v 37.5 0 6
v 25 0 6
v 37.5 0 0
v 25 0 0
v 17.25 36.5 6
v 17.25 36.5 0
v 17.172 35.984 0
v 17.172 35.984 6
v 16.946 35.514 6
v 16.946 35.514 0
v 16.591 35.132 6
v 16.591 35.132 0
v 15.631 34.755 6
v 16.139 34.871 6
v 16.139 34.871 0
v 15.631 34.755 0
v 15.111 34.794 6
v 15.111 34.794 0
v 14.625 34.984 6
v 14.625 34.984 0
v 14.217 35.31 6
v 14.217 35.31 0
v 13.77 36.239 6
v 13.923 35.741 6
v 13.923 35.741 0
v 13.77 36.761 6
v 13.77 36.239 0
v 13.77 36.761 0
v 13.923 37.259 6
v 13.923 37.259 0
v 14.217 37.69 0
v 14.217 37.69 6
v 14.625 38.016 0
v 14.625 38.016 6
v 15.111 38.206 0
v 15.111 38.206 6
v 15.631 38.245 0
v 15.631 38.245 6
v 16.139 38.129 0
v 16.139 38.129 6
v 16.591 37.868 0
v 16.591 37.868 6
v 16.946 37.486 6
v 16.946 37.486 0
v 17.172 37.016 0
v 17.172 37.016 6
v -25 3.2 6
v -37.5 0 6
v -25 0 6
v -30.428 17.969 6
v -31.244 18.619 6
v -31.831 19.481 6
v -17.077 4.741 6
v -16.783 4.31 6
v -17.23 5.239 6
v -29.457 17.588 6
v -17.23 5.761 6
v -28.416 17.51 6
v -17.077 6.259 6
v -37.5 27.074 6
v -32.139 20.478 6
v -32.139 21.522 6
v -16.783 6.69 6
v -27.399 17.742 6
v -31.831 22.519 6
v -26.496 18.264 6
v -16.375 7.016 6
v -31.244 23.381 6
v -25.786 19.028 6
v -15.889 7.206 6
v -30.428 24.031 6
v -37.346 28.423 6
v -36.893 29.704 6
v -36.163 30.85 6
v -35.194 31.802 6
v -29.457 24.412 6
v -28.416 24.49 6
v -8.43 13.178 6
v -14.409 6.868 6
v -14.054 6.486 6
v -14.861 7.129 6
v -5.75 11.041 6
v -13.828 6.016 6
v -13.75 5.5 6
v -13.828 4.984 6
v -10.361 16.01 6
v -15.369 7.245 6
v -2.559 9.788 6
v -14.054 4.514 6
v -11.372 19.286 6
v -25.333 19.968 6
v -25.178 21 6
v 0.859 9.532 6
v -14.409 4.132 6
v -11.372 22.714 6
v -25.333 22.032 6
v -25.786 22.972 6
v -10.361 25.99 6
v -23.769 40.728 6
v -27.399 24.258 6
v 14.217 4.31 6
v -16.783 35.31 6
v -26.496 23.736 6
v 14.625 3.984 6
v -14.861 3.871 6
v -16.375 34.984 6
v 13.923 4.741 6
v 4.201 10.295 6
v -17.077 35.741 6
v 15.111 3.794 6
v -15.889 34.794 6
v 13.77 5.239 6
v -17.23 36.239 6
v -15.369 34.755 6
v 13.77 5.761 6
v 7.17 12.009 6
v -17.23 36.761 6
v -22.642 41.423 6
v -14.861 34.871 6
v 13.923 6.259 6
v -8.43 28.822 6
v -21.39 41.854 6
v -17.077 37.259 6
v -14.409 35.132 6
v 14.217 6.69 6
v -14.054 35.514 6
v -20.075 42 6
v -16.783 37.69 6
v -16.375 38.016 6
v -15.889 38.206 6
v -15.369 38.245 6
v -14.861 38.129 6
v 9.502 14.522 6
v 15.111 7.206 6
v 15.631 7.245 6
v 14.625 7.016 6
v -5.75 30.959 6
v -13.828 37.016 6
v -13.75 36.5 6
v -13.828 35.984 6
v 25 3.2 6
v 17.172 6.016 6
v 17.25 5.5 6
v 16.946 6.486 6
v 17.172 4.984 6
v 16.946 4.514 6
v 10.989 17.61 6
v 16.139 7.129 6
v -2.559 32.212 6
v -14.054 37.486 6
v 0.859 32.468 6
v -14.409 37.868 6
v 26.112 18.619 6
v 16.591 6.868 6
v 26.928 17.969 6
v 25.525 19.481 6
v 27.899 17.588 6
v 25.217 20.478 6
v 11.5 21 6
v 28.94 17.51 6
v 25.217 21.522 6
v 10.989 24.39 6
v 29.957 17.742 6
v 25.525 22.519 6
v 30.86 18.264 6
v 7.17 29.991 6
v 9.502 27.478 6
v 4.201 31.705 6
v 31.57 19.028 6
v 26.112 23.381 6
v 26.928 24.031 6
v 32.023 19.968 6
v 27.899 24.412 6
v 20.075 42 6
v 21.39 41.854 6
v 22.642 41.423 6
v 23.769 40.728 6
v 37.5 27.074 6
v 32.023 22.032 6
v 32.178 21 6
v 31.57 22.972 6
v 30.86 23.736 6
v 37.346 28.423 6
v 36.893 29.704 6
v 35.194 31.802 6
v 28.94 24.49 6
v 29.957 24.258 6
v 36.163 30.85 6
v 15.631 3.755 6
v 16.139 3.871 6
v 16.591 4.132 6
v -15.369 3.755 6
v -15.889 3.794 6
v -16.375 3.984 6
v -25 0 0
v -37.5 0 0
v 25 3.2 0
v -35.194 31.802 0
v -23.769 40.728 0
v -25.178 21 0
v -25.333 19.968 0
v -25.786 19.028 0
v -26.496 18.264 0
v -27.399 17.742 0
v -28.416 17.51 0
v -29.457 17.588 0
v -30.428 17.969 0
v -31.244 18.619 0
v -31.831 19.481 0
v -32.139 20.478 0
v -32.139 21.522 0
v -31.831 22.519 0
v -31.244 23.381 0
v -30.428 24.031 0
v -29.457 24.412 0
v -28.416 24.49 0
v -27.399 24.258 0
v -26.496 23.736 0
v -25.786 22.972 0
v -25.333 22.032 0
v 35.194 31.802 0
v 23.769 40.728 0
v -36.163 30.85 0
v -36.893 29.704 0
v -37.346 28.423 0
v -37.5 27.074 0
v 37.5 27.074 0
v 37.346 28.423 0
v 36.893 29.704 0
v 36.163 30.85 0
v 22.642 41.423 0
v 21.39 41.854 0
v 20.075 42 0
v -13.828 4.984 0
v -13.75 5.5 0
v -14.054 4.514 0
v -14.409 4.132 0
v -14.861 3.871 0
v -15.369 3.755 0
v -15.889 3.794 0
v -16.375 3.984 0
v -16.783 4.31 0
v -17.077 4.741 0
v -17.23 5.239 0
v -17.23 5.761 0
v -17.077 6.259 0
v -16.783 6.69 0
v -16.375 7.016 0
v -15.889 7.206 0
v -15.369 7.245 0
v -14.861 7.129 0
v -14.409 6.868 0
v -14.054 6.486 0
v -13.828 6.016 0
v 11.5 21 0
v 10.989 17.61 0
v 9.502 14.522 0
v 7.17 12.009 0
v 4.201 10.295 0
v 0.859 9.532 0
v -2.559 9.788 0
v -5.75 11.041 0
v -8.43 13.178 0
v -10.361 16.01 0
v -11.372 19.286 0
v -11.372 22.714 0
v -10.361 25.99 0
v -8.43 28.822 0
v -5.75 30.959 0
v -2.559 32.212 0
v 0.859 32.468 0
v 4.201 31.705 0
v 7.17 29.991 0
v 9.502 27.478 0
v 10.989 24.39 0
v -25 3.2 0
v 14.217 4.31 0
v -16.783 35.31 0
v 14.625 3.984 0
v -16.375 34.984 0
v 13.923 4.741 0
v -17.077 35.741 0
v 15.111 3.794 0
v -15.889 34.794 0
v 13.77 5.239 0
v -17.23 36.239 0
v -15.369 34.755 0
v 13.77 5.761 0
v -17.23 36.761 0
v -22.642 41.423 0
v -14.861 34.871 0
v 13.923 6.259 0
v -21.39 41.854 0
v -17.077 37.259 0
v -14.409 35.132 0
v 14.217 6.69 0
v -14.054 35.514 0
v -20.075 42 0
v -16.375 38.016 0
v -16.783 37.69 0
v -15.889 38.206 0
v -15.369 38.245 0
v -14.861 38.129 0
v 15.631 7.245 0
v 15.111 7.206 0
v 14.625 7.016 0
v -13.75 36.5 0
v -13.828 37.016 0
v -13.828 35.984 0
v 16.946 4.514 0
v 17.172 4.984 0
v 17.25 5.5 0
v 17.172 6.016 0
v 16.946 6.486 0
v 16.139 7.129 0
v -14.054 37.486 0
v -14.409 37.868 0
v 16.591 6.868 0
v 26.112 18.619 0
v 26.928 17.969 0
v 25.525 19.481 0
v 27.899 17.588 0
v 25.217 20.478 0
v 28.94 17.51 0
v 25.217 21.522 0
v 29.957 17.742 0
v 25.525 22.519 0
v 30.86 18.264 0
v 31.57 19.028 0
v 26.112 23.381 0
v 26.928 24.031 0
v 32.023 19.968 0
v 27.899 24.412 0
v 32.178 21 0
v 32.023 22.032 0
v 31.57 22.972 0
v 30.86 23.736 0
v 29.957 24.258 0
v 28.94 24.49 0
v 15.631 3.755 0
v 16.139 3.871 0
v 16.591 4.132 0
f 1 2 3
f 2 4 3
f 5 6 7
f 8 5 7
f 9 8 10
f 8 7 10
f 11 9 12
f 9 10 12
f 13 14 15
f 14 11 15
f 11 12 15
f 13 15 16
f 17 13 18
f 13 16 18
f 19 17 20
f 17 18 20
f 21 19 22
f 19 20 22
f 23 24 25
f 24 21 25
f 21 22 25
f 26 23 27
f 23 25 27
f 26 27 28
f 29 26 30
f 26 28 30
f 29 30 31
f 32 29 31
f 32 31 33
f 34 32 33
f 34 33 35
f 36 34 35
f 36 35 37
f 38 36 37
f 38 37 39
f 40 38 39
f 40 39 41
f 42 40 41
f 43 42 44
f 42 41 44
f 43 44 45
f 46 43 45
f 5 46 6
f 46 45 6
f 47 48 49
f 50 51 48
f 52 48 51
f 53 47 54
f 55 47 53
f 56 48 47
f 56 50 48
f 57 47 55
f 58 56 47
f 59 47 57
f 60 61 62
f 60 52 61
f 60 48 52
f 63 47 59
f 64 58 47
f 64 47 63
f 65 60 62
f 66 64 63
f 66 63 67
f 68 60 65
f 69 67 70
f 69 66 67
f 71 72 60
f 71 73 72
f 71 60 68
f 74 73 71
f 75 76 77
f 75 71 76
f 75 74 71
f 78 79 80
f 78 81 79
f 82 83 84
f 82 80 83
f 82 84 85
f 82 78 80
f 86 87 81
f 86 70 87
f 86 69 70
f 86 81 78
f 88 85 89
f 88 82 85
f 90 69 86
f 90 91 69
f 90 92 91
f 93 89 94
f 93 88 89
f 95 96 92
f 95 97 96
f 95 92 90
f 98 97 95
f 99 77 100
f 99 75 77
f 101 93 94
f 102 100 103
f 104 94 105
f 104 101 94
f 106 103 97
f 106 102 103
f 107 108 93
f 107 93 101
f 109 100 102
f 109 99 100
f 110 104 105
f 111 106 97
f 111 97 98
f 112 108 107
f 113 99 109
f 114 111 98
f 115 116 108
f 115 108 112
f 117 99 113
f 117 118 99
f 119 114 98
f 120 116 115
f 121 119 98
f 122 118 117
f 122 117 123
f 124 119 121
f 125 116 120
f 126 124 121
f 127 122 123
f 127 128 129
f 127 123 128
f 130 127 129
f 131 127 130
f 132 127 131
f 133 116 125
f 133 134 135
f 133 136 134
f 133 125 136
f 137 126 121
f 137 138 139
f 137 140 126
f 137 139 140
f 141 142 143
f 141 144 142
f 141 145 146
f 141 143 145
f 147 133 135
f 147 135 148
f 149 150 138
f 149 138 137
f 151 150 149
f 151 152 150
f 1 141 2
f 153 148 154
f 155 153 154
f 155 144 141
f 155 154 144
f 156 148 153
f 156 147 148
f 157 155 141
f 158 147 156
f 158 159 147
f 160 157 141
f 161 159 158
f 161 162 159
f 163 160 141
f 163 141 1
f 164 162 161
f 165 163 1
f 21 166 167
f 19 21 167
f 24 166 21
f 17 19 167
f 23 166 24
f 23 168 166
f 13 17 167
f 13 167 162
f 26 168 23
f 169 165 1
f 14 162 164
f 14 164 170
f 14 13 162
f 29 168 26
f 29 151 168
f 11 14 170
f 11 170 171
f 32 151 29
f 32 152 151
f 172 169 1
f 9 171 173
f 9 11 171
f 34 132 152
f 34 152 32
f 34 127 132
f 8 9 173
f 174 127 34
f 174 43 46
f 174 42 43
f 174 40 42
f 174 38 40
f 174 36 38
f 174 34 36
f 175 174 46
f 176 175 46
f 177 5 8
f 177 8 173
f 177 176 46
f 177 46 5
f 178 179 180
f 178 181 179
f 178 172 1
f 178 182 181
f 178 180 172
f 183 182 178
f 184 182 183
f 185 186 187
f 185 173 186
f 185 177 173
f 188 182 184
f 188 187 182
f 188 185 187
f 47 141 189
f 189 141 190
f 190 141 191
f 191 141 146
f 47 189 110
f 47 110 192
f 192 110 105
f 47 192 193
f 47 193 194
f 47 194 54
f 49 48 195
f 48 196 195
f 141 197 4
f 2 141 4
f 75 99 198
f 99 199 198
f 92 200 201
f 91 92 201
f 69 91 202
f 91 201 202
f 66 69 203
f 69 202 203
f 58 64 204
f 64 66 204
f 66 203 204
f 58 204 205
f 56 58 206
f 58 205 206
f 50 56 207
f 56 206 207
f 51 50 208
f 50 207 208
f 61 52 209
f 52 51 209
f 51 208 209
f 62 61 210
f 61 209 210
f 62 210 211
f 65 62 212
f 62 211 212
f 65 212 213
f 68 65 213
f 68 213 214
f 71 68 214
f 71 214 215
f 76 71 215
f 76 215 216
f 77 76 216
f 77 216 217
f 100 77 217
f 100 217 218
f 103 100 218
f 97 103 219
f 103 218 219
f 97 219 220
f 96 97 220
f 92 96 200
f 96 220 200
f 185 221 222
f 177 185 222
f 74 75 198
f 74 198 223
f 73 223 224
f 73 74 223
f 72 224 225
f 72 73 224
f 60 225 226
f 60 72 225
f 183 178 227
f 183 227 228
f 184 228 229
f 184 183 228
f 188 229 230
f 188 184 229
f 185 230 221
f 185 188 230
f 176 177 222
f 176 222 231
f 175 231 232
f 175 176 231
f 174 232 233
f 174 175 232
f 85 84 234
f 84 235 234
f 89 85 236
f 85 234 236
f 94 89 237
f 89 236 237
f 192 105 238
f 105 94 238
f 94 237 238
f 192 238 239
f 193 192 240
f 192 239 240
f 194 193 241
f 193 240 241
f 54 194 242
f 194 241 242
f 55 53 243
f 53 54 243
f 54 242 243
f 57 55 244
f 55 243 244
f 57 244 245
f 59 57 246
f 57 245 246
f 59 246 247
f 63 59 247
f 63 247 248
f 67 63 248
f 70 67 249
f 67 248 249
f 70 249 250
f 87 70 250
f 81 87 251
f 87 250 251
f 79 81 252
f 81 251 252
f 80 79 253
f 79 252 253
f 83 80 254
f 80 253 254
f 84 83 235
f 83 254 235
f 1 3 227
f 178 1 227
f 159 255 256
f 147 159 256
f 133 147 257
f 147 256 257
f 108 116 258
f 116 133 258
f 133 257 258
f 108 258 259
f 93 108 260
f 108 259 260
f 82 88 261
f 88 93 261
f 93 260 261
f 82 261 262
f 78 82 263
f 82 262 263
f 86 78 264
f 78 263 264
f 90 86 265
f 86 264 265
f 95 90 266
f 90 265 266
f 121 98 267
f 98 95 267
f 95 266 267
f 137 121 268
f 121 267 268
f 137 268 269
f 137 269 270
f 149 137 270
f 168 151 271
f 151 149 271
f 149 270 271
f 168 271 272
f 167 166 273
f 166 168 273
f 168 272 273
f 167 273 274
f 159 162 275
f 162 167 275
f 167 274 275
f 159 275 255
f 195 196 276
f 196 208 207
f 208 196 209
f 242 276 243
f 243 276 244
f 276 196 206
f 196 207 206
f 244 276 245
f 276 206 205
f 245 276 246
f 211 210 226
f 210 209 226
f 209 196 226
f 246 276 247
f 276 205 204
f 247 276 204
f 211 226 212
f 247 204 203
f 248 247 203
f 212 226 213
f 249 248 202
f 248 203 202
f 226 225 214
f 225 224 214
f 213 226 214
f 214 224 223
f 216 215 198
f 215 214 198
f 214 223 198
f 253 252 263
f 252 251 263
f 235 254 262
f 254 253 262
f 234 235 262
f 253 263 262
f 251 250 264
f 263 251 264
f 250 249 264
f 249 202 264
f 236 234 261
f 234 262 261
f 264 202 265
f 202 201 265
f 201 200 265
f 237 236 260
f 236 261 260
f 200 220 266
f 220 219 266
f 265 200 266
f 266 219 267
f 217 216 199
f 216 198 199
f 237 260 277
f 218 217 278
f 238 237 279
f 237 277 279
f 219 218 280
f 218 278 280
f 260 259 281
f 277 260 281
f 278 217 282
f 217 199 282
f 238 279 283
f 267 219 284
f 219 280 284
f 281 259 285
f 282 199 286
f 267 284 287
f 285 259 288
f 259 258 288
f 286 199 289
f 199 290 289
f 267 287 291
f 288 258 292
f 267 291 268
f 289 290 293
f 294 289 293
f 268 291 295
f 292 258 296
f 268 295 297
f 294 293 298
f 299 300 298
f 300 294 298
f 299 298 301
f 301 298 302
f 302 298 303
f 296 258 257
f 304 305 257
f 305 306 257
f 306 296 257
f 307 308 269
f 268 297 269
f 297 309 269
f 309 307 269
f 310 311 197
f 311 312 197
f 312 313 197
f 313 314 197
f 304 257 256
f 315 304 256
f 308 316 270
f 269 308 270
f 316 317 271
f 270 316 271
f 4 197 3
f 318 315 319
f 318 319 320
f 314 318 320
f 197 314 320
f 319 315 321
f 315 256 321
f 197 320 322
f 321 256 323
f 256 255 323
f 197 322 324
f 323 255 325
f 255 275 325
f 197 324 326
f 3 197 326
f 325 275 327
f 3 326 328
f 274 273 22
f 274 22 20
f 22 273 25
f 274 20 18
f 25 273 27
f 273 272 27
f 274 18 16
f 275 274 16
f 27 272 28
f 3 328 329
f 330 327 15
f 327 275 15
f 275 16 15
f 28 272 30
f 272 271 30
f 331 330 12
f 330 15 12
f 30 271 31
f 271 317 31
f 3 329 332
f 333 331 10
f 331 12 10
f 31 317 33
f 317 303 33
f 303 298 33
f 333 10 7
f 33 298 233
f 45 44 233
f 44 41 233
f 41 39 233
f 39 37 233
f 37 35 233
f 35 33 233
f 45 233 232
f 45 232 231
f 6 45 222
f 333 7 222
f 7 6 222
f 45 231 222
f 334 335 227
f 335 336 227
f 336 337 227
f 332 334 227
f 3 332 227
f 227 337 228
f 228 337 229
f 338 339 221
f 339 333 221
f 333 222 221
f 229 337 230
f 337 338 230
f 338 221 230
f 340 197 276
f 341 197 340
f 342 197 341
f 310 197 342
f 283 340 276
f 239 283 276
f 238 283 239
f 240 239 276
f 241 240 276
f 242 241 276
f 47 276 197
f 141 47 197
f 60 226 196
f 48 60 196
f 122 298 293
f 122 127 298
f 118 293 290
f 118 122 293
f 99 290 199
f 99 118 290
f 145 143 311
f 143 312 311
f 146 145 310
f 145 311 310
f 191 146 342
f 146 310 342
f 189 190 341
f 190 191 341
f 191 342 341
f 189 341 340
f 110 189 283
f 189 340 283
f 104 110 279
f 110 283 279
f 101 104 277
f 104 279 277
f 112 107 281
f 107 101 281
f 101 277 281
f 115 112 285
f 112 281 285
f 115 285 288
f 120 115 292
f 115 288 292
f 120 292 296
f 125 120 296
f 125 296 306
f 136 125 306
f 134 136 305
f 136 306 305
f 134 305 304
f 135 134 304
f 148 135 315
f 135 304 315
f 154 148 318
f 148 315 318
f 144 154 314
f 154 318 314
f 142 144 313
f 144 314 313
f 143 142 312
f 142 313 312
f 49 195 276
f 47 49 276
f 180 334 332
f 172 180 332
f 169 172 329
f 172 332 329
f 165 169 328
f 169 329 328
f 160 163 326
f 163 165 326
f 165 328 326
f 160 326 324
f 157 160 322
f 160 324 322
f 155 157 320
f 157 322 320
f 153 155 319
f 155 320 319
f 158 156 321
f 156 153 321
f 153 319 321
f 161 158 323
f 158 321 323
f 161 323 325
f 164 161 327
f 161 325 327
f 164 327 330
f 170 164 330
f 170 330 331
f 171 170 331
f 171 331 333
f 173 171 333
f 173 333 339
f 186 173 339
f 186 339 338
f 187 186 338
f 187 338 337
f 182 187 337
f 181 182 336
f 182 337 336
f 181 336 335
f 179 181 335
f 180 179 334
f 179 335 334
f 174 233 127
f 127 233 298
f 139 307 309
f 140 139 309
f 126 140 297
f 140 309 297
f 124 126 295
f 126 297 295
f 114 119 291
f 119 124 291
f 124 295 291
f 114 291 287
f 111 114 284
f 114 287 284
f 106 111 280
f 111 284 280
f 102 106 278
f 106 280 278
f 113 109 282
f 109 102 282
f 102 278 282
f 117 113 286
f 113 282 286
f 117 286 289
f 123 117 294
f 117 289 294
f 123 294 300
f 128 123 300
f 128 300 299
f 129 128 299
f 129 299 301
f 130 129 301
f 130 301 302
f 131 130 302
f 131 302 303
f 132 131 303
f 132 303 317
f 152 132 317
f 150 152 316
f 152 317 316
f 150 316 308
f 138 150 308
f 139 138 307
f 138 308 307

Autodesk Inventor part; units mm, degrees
ref_plane "YZ Plane" through (0, 0, 0) normal (1, 0, 0) x (0, 1, 0)
ref_plane "XZ Plane" through (0, 0, 0) normal (0, 1, 0) x (-1, 0, 0)
ref_plane "XY Plane" through (0, 0, 0) normal (0, 0, 1) x (1, 0, 0)
sketch "Sketch1" plane through (0, 0, 0) normal (0, 0, 1) x (1, 0, 0)
  line L0 (37.5, 0) -> (37.5, 30)
  line L1 (37.5, 30) -> (22.1407, 42)
  line L2 (22.1407, 42) -> (-22.1407, 42)
  line L3 (-22.1407, 42) -> (-37.5, 30)
  line L4 (-37.5, 30) -> (-37.5, 0)
  circle A0 centre (-28.678, 21) radius 3.5
  circle A1 centre (28.678, 21) radius 3.5
  circle A2 centre (-15.5, 36.5) radius 1.75
  circle A3 centre (15.5, 36.5) radius 1.75
  circle A4 centre (-15.5, 5.5) radius 1.75
  circle A5 centre (15.5, 5.5) radius 1.75
  circle A6 centre (0, 21) radius 11.5
  line L5 (-37.5, 0) -> (-25, 0)
  line L6 (-25, 0) -> (-25, 3.2)
  line L7 (-25, 3.2) -> (25, 3.2)
  line L8 (25, 3.2) -> (25, 0)
  line L9 (25, 0) -> (37.5, 0)
  point P0 (0, 0)
  point P1 (0, 42)
  point P2 (0, 0)
  dimension "d0" = 30
  dimension "d1" = 30
  dimension "d3" = 128
  dimension "d4" = 75
  dimension "d5" = 7
  dimension "d7" = 7
  dimension "d9" = 28.678
  dimension "d10" = 28.678
  dimension "d13" = 3.5
  dimension "d14" = 3.5
  dimension "d15" = 15.5
  dimension "d16" = 15.5
  dimension "d21" = 3.5
  dimension "d22" = 3.5
  dimension "d23" = 31
  dimension "d24" = 23
  dimension "d28" = 50
  dimension "d29" = 12.5
  dimension "d30" = 3.2
  dimension "d31" = 17.8
  dimension "d32" = 2.3
  dimension "d33" = 128
  dimension "d34" = 44.2814
  dimension "d35" = 12
  dimension "d36" = 12
  dimension "d37" = 42
extrude "Extrusion2" add sketch "Sketch1" along normal blind 6
fillet "Fillet2" radius 6 4 edges at (22.1407, 42, 3) (37.5, 30, 3) (-22.1407, 42, 3) (-37.5, 30, 3)
equation "\"d1\" = d0"
equation "\"d7\" = d5"
equation "\"d10\" = d9"
equation "\"d14\" = d13"
equation "\"d16\" = d15"
equation "\"d21\" = d13"
equation "\"d22\" = d13"
properties part number "Tope riel motor"
